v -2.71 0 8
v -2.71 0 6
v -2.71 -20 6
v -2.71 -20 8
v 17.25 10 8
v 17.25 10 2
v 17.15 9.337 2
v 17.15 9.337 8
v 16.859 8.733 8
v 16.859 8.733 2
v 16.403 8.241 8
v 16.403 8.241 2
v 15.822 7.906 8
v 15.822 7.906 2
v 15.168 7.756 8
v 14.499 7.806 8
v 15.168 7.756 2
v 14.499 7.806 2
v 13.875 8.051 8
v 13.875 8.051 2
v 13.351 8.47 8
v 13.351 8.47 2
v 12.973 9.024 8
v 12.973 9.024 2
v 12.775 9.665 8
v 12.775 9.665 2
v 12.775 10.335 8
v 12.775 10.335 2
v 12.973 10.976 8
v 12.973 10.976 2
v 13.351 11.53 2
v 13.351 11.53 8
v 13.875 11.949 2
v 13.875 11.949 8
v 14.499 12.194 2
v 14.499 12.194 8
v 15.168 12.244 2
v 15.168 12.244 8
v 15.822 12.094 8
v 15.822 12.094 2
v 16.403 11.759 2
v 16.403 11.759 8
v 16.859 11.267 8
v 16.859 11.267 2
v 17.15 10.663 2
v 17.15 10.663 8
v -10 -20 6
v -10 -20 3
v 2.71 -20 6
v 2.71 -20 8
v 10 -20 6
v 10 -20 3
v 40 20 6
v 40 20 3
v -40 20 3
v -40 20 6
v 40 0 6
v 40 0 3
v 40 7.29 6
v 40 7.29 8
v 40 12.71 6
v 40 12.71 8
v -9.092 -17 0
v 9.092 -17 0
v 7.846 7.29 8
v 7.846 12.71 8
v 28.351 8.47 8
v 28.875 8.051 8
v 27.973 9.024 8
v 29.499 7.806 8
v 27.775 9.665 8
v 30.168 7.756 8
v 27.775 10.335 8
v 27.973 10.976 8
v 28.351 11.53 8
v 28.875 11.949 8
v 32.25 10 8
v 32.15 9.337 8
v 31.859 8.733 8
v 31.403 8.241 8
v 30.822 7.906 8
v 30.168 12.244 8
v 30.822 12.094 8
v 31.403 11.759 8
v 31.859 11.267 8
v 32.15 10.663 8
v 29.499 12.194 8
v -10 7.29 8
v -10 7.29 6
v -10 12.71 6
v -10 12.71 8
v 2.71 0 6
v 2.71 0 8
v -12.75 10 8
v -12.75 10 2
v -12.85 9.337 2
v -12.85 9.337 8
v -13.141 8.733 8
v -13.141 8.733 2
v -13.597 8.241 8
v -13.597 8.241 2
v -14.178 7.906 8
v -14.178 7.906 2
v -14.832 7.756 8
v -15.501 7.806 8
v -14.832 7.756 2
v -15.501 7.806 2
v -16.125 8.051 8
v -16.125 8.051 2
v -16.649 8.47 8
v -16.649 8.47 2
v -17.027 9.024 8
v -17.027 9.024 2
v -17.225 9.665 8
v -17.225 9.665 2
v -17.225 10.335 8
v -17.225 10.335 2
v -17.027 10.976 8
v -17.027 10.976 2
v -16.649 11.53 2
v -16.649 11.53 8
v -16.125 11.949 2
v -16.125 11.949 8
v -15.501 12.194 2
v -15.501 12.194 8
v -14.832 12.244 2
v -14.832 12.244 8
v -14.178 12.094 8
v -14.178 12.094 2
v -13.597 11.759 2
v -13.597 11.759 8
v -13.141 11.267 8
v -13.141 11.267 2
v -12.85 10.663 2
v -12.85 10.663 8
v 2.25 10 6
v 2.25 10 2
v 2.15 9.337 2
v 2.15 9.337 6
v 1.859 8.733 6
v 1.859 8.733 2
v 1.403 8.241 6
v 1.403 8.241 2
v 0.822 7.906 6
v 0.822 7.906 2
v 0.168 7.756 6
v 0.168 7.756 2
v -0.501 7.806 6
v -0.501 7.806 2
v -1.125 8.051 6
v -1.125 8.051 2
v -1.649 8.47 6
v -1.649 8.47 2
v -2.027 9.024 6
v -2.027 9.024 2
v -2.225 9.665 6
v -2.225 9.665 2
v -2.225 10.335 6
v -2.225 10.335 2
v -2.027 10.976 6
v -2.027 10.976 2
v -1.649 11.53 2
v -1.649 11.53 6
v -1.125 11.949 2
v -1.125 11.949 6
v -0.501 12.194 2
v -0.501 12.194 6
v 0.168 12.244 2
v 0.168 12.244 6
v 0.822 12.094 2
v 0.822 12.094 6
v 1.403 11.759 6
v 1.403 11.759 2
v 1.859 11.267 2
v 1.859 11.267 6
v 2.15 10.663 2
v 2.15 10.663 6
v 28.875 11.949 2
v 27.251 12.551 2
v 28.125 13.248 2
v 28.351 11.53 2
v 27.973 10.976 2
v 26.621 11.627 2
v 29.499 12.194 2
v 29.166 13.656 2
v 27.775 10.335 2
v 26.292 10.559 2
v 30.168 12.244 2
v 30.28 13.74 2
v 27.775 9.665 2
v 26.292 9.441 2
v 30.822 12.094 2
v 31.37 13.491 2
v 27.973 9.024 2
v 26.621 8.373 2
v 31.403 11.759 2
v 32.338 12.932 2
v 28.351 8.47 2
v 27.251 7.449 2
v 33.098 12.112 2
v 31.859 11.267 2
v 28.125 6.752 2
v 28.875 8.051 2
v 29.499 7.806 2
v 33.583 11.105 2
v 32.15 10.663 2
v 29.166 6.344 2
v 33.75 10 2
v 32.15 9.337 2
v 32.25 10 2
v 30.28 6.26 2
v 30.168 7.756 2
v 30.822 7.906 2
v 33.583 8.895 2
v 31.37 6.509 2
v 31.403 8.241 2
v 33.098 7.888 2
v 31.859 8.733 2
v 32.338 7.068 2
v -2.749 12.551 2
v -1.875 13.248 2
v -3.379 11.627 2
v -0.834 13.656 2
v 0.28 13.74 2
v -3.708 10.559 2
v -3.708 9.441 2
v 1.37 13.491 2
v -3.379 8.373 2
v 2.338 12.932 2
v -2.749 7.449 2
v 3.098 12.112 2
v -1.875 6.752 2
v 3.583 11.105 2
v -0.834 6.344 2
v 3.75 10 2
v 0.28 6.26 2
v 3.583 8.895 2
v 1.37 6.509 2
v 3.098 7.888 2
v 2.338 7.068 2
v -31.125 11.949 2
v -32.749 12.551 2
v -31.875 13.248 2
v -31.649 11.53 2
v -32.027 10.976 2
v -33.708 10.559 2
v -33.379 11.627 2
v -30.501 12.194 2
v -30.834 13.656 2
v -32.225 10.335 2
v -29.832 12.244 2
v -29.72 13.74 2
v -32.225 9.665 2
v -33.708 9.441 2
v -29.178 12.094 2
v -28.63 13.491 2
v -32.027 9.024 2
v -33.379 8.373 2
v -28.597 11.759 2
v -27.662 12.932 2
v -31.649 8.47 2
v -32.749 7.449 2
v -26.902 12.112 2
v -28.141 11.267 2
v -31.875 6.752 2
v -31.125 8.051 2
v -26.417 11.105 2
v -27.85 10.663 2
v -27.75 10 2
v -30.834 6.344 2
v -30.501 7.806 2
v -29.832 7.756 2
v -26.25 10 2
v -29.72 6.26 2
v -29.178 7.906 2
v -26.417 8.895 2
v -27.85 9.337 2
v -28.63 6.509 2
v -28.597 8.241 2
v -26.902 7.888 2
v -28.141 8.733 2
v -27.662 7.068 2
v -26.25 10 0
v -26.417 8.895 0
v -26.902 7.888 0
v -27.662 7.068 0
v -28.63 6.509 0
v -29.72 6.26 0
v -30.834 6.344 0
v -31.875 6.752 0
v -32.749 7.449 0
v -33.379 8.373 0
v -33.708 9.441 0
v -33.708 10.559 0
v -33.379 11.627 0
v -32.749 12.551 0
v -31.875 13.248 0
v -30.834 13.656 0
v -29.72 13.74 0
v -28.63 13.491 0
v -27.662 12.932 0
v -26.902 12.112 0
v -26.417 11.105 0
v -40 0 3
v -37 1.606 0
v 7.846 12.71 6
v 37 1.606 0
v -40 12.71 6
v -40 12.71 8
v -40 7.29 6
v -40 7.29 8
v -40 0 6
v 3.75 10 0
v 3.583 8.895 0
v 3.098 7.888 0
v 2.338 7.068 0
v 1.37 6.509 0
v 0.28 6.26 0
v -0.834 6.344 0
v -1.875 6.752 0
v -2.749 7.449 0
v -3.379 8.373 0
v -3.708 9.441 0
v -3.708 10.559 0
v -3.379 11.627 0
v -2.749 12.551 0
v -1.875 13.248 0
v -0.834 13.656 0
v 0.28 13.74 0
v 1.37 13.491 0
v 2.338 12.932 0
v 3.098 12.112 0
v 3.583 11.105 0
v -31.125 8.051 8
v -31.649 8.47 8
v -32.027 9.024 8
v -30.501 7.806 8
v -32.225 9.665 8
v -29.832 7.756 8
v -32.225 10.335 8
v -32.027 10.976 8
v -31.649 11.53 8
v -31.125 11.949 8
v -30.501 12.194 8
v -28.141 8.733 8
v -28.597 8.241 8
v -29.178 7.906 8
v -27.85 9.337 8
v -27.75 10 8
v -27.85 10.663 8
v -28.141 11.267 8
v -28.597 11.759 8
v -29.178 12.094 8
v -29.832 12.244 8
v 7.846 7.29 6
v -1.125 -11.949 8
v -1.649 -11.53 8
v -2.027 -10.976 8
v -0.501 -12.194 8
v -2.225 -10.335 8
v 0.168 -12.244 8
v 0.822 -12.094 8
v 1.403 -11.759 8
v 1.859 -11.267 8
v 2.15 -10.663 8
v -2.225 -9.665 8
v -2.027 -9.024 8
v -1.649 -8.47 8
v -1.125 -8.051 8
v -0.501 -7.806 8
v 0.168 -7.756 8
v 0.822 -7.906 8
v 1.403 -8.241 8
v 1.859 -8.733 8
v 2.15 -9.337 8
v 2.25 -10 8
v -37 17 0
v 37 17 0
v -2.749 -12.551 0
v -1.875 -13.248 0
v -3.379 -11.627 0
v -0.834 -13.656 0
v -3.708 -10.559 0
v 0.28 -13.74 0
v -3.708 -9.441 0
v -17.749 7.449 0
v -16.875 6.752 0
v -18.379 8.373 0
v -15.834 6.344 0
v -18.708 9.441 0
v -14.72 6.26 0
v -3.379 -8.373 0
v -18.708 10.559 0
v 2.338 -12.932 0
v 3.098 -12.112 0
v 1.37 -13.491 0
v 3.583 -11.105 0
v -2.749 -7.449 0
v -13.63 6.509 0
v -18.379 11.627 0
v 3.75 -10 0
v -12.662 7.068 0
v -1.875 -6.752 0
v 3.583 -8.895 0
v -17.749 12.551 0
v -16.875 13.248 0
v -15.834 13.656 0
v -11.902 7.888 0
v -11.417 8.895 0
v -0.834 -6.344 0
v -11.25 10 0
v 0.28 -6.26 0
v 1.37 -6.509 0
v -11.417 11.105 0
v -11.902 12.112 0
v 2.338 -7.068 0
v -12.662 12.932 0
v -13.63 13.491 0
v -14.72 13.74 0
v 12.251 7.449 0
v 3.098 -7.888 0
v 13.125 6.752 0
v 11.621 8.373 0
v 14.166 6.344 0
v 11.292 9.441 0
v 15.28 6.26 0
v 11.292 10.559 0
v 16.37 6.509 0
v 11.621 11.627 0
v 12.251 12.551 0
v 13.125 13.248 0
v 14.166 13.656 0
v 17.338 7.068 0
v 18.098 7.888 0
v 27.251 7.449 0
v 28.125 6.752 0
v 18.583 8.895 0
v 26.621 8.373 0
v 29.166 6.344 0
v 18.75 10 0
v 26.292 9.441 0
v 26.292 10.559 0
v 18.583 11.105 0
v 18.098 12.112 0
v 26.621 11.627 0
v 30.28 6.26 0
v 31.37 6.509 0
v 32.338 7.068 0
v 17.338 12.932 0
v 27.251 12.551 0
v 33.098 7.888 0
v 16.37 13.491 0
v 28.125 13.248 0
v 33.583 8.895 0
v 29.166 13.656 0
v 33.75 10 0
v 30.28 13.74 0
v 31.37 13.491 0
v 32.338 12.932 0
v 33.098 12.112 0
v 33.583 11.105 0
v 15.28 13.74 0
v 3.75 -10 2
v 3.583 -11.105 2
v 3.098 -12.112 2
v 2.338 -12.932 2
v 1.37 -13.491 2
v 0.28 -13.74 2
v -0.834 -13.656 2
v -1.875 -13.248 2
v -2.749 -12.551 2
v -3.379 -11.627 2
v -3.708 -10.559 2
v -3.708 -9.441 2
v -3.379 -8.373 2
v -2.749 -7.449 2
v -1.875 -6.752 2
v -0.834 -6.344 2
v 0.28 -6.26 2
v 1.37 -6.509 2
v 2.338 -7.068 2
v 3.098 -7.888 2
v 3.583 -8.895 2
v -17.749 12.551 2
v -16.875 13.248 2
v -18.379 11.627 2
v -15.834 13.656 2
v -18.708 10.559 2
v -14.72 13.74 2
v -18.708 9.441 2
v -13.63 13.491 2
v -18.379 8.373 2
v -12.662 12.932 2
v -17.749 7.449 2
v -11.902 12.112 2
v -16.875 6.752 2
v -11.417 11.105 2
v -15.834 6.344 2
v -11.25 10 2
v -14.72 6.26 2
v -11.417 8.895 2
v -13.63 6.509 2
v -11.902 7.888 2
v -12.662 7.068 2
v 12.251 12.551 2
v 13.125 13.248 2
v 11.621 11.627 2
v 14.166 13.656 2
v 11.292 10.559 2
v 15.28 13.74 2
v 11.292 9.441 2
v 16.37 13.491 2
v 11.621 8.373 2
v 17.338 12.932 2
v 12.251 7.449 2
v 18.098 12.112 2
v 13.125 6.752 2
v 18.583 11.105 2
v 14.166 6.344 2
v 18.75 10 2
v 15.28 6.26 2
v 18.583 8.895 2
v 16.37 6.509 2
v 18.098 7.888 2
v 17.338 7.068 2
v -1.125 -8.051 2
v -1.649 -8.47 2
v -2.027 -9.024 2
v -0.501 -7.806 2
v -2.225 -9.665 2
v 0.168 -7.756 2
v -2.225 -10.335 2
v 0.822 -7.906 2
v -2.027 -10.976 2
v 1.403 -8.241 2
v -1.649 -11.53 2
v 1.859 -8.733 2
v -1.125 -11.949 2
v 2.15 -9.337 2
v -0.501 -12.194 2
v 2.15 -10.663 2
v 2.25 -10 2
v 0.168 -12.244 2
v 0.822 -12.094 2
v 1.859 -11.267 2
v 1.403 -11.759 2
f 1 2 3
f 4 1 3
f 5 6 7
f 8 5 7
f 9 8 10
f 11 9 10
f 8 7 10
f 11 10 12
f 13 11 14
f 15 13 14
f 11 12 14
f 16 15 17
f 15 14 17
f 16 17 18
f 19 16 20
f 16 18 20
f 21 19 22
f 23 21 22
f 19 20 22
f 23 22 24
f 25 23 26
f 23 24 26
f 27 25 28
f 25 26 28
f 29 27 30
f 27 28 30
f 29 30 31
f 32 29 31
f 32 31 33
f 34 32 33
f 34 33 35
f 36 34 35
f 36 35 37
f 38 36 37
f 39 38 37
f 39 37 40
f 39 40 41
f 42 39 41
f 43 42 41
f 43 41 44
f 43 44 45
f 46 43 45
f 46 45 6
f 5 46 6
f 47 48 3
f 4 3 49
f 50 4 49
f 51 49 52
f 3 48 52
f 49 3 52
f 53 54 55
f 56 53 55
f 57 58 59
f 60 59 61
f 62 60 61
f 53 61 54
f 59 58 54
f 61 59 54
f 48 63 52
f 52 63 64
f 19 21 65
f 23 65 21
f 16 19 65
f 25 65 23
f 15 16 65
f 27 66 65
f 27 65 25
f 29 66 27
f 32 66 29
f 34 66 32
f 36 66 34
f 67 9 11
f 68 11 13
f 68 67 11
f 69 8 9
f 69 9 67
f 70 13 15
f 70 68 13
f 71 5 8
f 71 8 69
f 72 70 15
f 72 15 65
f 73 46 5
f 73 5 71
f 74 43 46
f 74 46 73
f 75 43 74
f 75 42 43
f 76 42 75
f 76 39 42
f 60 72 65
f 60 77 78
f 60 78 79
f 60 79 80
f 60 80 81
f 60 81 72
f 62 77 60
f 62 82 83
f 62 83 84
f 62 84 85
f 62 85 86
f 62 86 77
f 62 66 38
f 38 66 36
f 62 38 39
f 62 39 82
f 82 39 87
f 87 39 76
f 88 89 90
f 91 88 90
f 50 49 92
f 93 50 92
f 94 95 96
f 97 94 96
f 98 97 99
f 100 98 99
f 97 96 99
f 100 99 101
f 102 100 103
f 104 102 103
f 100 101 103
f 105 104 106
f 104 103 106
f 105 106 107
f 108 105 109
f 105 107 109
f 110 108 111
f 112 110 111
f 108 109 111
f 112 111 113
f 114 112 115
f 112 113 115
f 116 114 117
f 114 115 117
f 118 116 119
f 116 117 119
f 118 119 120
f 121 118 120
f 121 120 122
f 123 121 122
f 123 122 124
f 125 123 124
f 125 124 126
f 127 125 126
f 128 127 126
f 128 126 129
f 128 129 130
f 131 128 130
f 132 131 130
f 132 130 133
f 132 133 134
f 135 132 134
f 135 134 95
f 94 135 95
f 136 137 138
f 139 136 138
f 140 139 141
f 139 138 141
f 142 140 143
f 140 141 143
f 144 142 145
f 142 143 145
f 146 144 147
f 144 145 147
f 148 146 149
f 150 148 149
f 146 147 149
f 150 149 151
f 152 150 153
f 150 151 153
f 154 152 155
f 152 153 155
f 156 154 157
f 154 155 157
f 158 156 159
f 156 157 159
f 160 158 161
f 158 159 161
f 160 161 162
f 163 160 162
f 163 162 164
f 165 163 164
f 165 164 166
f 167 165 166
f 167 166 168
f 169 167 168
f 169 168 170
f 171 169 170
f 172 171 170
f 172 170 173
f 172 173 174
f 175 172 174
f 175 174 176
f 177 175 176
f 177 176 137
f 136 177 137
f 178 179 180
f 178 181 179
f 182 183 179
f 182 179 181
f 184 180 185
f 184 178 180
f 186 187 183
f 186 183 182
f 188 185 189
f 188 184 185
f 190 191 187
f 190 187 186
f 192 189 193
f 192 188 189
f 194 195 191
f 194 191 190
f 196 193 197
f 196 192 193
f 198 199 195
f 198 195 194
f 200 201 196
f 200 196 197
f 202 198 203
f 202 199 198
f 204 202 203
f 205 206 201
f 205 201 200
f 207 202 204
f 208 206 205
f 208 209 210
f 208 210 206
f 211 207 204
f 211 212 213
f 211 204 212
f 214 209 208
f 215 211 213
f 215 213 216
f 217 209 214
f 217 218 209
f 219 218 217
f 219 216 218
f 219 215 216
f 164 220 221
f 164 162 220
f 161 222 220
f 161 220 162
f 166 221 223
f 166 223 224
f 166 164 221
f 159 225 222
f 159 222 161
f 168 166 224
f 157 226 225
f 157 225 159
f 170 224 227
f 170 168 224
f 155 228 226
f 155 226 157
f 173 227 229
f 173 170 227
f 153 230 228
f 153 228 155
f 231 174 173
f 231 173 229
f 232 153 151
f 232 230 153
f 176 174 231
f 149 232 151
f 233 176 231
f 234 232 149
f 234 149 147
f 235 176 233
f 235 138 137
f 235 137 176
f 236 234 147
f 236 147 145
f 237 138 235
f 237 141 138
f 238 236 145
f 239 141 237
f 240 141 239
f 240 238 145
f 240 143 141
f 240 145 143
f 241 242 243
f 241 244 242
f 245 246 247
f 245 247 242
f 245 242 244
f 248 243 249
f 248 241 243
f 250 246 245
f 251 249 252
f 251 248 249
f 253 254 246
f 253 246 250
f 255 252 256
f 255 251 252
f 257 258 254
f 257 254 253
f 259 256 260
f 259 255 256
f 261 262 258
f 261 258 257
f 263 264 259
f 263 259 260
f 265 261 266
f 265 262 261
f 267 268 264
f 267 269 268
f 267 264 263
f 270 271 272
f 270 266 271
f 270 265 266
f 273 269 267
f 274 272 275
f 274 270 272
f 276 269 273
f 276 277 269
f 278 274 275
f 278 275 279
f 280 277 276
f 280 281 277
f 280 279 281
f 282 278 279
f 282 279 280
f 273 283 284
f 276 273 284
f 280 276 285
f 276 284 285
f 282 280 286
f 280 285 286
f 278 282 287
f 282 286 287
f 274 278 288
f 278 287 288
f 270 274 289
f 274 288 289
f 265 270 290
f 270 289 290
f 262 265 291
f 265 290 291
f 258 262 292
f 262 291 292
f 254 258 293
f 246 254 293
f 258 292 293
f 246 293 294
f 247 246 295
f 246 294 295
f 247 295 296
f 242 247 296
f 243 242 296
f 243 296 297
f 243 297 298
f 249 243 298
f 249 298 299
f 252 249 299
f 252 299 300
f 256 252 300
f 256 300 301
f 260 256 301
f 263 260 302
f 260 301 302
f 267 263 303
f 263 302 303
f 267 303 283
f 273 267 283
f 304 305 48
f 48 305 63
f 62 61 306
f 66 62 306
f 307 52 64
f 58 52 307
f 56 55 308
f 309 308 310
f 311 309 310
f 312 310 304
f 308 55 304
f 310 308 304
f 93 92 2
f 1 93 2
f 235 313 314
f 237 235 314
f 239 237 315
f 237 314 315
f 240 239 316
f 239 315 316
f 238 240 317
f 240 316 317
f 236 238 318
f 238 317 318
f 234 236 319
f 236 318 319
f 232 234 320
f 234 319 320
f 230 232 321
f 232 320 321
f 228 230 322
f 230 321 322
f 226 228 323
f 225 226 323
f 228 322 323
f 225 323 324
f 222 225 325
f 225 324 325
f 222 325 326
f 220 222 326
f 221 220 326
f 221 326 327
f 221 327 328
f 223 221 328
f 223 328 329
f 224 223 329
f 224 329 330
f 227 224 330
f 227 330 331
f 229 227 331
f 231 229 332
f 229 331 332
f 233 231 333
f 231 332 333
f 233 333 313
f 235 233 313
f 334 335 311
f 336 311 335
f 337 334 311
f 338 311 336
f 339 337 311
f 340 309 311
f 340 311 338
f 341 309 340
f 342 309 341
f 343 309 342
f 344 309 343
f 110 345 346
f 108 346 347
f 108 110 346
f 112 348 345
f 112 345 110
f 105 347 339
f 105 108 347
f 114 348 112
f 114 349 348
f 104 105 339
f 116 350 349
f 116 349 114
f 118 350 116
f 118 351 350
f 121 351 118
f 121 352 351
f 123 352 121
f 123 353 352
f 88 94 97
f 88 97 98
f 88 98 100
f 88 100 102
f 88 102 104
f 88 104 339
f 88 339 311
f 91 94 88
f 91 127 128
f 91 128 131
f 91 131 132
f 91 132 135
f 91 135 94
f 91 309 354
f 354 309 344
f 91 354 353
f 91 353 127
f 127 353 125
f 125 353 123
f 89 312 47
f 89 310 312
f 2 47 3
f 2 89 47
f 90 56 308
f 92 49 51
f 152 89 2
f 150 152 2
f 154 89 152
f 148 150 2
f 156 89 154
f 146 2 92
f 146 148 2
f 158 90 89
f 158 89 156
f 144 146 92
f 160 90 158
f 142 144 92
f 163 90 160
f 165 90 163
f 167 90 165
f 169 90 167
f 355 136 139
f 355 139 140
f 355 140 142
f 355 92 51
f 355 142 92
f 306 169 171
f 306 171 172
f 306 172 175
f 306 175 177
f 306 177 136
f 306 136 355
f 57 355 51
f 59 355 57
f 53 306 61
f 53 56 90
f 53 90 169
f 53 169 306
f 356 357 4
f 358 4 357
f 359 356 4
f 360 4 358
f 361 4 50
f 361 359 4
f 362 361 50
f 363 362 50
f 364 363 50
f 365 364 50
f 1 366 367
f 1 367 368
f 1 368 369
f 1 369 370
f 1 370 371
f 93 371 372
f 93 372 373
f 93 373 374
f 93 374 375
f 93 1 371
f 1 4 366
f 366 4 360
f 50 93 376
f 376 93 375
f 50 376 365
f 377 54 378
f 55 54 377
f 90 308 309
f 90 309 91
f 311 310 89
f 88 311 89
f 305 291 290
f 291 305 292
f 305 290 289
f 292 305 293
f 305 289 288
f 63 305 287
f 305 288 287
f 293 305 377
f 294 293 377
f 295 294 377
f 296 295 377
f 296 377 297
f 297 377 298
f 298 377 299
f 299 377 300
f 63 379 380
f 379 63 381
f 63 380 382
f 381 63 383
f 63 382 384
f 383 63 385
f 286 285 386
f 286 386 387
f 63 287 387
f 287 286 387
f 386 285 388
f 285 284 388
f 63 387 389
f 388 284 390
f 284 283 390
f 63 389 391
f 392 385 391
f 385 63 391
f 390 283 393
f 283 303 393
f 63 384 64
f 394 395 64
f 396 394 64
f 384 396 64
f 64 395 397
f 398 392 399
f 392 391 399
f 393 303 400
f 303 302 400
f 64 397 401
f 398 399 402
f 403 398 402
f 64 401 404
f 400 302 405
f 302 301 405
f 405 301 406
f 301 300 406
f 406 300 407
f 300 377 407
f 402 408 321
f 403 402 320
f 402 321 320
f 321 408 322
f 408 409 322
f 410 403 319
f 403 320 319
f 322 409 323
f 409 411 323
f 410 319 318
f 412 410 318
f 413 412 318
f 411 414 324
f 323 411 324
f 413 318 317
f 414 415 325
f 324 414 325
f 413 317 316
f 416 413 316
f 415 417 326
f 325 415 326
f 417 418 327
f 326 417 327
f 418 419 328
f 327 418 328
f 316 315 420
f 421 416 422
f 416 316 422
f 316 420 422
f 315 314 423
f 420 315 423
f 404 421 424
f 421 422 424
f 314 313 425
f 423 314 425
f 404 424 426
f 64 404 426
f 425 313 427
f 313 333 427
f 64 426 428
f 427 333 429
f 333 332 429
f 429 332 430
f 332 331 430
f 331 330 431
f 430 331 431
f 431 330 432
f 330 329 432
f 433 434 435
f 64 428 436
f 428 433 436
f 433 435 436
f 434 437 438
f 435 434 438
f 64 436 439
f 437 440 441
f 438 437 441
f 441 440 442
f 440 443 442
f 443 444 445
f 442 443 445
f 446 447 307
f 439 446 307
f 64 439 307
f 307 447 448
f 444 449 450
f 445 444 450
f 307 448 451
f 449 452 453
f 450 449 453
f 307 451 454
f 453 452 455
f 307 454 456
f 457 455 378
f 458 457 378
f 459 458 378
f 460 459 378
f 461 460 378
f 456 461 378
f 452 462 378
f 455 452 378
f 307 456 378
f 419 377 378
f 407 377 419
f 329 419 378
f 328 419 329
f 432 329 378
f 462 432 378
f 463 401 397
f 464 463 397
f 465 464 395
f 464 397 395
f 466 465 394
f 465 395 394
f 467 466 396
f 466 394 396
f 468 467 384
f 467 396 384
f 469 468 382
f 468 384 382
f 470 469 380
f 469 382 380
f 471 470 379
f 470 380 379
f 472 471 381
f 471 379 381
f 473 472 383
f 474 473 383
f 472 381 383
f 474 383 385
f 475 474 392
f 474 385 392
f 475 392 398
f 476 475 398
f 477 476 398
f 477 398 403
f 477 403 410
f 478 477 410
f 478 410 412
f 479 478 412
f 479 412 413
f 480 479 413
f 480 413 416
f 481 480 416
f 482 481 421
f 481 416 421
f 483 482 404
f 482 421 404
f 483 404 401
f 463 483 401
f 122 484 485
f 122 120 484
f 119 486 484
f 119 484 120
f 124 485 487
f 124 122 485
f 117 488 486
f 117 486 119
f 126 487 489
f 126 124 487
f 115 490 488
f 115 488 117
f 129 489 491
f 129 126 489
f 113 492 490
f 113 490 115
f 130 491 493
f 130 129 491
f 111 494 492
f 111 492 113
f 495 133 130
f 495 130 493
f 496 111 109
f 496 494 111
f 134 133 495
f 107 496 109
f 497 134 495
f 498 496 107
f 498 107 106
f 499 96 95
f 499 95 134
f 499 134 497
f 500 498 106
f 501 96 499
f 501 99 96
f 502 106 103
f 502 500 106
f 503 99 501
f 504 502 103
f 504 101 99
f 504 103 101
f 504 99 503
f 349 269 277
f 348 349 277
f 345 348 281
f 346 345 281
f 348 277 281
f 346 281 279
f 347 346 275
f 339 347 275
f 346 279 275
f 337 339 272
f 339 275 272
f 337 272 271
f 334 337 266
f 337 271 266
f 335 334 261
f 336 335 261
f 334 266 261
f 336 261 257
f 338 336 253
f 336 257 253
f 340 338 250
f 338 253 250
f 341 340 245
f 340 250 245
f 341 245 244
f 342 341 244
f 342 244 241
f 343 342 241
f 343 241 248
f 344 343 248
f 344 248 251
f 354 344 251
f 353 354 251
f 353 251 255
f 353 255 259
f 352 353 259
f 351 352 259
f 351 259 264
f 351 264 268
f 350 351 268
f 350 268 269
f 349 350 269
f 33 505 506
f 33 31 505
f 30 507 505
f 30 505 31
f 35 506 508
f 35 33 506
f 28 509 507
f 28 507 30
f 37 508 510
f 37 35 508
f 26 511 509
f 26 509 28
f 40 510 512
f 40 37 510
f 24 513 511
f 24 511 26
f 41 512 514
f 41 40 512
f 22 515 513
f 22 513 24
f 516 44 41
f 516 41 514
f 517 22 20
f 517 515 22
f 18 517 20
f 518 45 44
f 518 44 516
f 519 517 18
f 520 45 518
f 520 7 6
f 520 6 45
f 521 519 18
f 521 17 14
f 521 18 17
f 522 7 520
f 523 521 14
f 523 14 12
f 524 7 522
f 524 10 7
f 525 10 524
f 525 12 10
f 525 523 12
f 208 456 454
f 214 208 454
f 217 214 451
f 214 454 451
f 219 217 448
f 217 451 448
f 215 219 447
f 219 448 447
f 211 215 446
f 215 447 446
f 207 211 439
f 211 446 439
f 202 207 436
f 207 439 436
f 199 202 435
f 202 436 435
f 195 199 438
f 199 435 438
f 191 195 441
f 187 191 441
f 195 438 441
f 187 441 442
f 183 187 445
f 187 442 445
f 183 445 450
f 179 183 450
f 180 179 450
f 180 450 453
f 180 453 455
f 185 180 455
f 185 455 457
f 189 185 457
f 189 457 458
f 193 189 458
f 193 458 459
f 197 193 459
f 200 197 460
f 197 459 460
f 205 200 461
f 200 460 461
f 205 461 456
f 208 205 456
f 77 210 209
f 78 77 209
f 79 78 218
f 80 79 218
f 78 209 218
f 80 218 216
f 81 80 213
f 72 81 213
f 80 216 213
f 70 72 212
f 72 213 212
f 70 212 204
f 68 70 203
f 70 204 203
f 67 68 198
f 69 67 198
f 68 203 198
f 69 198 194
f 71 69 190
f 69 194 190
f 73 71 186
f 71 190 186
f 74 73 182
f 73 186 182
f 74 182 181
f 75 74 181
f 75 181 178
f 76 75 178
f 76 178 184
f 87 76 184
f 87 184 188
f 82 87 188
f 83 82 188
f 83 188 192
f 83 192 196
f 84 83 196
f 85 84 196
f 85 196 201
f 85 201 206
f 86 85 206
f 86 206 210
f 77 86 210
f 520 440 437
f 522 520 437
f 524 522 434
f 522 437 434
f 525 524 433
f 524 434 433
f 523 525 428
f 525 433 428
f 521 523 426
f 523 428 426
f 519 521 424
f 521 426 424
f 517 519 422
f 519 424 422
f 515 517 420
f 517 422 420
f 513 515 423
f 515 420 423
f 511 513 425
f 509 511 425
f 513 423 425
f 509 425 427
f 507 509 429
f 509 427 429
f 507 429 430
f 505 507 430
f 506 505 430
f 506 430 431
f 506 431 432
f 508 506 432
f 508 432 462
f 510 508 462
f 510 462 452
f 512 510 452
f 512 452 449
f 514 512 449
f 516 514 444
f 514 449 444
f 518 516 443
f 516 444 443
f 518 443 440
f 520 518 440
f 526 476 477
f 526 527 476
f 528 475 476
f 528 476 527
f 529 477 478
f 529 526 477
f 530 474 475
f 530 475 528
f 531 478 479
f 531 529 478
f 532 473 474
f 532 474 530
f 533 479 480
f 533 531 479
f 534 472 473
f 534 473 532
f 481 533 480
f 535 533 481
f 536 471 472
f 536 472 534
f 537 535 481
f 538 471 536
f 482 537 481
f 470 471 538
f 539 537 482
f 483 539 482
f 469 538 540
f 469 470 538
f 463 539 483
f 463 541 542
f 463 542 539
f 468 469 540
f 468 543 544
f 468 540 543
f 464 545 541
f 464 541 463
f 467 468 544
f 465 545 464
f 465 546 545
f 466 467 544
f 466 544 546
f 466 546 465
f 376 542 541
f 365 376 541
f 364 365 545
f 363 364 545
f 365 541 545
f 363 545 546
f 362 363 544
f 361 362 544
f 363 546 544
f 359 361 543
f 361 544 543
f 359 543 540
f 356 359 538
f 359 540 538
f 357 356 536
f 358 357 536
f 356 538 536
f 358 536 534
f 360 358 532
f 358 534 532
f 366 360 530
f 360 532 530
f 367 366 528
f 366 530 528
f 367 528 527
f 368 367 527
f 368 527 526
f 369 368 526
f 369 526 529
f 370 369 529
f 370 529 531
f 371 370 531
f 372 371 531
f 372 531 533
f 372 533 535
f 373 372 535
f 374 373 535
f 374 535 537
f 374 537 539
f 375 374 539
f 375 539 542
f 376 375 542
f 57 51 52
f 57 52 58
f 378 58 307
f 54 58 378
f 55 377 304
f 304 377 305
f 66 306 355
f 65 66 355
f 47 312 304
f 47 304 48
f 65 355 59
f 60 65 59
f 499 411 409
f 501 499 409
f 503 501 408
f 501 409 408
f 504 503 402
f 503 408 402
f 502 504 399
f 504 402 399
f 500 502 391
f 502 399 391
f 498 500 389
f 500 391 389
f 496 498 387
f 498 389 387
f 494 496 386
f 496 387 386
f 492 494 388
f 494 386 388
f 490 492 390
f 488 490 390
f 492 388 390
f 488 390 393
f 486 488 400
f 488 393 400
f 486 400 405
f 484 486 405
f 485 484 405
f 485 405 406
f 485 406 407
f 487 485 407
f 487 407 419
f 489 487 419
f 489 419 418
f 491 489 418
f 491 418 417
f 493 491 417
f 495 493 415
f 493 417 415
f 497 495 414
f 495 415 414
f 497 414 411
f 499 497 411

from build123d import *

# Parameters (mm, degrees)
F1_DEPTH = 6
F2_W     = 30
F2_H     = 5.42
F3_DEPTH = 2
F4_R     = 2.25
F5_DEPTH = 8.001
F6_R     = 3.75
F7_DEPTH = 2
F9_DEPTH = 6
F10_SIZE = 3


with BuildPart() as f1:
    # F0 (on Top) → F1 (new body)
    with BuildSketch(Plane.XY):
        Polygon((-40, 0), (-10, 0), (-10, -20), (0, -20), (10, -20), (10, 0), (40, 0), (40, 20), (0, 20), (-40, 20), align=None)
    extrude(amount=F1_DEPTH)

    # F2 (on face) → F3 (join)
    with BuildSketch(Plane.XY.offset(6)):
        Polygon((2.71, 0), (0, 0), (-2.71, 0), (-2.71, -20), (2.71, -20), align=None)
        Polygon((7.845558, 12.71), (7.845558, 10), (7.845558, 7.29), (40, 7.29), (40, 12.71), align=None)
        with Locations((-25, 10)):
            Rectangle(F2_W, F2_H)
    extrude(amount=F3_DEPTH)

    # F4 (on face) → F5 (cut, through all)
    with BuildSketch(Plane(origin=(0, 0, 0), x_dir=(1, 0, 0), z_dir=(0, 0, -1))):
        with Locations((-30, -10)):
            Circle(F4_R)
        with Locations((0, -10)):
            Circle(F4_R)
        with Locations((0, 10)):
            Circle(F4_R)
        with Locations((30, -10)):
            Circle(F4_R)
        with Locations((15, -10)):
            Circle(F4_R)
        with Locations((-15, -10)):
            Circle(F4_R)
    extrude(amount=-F5_DEPTH, mode=Mode.SUBTRACT)

    # F6 (on face) → F7 (cut)
    with BuildSketch(Plane(origin=(0, 0, 0), x_dir=(1, 0, 0), z_dir=(0, 0, -1))):
        with Locations((0, 10)):
            Circle(F6_R)
        with Locations((0, -10)):
            Circle(F6_R)
        with Locations((30, -10)):
            Circle(F6_R)
        with Locations((-30, -10)):
            Circle(F6_R)
        with Locations((-15, -10)):
            Circle(F6_R)
        with Locations((15, -10)):
            Circle(F6_R)
    extrude(amount=-F7_DEPTH, mode=Mode.SUBTRACT)

    # F8 (on face) → F9 (join)
    with BuildSketch(Plane.XY.offset(6)):
        Polygon((-10, 0), (-40, 0), (-10, -20), align=None)
        Polygon((10, 0), (10, -20), (40, 0), align=None)
    extrude(amount=-F9_DEPTH)

    # F10
    f10_edges = [f1.edges().sort_by_distance(p)[0] for p in [
        (-25, -10, 0),
        (0, -20, 0),
        (25, -10, 0),
        (40, 10, 0),
        (-40, 10, 0),
        (0, 20, 0),
    ]]
    chamfer(f10_edges, length=F10_SIZE)


solid = f1.part
